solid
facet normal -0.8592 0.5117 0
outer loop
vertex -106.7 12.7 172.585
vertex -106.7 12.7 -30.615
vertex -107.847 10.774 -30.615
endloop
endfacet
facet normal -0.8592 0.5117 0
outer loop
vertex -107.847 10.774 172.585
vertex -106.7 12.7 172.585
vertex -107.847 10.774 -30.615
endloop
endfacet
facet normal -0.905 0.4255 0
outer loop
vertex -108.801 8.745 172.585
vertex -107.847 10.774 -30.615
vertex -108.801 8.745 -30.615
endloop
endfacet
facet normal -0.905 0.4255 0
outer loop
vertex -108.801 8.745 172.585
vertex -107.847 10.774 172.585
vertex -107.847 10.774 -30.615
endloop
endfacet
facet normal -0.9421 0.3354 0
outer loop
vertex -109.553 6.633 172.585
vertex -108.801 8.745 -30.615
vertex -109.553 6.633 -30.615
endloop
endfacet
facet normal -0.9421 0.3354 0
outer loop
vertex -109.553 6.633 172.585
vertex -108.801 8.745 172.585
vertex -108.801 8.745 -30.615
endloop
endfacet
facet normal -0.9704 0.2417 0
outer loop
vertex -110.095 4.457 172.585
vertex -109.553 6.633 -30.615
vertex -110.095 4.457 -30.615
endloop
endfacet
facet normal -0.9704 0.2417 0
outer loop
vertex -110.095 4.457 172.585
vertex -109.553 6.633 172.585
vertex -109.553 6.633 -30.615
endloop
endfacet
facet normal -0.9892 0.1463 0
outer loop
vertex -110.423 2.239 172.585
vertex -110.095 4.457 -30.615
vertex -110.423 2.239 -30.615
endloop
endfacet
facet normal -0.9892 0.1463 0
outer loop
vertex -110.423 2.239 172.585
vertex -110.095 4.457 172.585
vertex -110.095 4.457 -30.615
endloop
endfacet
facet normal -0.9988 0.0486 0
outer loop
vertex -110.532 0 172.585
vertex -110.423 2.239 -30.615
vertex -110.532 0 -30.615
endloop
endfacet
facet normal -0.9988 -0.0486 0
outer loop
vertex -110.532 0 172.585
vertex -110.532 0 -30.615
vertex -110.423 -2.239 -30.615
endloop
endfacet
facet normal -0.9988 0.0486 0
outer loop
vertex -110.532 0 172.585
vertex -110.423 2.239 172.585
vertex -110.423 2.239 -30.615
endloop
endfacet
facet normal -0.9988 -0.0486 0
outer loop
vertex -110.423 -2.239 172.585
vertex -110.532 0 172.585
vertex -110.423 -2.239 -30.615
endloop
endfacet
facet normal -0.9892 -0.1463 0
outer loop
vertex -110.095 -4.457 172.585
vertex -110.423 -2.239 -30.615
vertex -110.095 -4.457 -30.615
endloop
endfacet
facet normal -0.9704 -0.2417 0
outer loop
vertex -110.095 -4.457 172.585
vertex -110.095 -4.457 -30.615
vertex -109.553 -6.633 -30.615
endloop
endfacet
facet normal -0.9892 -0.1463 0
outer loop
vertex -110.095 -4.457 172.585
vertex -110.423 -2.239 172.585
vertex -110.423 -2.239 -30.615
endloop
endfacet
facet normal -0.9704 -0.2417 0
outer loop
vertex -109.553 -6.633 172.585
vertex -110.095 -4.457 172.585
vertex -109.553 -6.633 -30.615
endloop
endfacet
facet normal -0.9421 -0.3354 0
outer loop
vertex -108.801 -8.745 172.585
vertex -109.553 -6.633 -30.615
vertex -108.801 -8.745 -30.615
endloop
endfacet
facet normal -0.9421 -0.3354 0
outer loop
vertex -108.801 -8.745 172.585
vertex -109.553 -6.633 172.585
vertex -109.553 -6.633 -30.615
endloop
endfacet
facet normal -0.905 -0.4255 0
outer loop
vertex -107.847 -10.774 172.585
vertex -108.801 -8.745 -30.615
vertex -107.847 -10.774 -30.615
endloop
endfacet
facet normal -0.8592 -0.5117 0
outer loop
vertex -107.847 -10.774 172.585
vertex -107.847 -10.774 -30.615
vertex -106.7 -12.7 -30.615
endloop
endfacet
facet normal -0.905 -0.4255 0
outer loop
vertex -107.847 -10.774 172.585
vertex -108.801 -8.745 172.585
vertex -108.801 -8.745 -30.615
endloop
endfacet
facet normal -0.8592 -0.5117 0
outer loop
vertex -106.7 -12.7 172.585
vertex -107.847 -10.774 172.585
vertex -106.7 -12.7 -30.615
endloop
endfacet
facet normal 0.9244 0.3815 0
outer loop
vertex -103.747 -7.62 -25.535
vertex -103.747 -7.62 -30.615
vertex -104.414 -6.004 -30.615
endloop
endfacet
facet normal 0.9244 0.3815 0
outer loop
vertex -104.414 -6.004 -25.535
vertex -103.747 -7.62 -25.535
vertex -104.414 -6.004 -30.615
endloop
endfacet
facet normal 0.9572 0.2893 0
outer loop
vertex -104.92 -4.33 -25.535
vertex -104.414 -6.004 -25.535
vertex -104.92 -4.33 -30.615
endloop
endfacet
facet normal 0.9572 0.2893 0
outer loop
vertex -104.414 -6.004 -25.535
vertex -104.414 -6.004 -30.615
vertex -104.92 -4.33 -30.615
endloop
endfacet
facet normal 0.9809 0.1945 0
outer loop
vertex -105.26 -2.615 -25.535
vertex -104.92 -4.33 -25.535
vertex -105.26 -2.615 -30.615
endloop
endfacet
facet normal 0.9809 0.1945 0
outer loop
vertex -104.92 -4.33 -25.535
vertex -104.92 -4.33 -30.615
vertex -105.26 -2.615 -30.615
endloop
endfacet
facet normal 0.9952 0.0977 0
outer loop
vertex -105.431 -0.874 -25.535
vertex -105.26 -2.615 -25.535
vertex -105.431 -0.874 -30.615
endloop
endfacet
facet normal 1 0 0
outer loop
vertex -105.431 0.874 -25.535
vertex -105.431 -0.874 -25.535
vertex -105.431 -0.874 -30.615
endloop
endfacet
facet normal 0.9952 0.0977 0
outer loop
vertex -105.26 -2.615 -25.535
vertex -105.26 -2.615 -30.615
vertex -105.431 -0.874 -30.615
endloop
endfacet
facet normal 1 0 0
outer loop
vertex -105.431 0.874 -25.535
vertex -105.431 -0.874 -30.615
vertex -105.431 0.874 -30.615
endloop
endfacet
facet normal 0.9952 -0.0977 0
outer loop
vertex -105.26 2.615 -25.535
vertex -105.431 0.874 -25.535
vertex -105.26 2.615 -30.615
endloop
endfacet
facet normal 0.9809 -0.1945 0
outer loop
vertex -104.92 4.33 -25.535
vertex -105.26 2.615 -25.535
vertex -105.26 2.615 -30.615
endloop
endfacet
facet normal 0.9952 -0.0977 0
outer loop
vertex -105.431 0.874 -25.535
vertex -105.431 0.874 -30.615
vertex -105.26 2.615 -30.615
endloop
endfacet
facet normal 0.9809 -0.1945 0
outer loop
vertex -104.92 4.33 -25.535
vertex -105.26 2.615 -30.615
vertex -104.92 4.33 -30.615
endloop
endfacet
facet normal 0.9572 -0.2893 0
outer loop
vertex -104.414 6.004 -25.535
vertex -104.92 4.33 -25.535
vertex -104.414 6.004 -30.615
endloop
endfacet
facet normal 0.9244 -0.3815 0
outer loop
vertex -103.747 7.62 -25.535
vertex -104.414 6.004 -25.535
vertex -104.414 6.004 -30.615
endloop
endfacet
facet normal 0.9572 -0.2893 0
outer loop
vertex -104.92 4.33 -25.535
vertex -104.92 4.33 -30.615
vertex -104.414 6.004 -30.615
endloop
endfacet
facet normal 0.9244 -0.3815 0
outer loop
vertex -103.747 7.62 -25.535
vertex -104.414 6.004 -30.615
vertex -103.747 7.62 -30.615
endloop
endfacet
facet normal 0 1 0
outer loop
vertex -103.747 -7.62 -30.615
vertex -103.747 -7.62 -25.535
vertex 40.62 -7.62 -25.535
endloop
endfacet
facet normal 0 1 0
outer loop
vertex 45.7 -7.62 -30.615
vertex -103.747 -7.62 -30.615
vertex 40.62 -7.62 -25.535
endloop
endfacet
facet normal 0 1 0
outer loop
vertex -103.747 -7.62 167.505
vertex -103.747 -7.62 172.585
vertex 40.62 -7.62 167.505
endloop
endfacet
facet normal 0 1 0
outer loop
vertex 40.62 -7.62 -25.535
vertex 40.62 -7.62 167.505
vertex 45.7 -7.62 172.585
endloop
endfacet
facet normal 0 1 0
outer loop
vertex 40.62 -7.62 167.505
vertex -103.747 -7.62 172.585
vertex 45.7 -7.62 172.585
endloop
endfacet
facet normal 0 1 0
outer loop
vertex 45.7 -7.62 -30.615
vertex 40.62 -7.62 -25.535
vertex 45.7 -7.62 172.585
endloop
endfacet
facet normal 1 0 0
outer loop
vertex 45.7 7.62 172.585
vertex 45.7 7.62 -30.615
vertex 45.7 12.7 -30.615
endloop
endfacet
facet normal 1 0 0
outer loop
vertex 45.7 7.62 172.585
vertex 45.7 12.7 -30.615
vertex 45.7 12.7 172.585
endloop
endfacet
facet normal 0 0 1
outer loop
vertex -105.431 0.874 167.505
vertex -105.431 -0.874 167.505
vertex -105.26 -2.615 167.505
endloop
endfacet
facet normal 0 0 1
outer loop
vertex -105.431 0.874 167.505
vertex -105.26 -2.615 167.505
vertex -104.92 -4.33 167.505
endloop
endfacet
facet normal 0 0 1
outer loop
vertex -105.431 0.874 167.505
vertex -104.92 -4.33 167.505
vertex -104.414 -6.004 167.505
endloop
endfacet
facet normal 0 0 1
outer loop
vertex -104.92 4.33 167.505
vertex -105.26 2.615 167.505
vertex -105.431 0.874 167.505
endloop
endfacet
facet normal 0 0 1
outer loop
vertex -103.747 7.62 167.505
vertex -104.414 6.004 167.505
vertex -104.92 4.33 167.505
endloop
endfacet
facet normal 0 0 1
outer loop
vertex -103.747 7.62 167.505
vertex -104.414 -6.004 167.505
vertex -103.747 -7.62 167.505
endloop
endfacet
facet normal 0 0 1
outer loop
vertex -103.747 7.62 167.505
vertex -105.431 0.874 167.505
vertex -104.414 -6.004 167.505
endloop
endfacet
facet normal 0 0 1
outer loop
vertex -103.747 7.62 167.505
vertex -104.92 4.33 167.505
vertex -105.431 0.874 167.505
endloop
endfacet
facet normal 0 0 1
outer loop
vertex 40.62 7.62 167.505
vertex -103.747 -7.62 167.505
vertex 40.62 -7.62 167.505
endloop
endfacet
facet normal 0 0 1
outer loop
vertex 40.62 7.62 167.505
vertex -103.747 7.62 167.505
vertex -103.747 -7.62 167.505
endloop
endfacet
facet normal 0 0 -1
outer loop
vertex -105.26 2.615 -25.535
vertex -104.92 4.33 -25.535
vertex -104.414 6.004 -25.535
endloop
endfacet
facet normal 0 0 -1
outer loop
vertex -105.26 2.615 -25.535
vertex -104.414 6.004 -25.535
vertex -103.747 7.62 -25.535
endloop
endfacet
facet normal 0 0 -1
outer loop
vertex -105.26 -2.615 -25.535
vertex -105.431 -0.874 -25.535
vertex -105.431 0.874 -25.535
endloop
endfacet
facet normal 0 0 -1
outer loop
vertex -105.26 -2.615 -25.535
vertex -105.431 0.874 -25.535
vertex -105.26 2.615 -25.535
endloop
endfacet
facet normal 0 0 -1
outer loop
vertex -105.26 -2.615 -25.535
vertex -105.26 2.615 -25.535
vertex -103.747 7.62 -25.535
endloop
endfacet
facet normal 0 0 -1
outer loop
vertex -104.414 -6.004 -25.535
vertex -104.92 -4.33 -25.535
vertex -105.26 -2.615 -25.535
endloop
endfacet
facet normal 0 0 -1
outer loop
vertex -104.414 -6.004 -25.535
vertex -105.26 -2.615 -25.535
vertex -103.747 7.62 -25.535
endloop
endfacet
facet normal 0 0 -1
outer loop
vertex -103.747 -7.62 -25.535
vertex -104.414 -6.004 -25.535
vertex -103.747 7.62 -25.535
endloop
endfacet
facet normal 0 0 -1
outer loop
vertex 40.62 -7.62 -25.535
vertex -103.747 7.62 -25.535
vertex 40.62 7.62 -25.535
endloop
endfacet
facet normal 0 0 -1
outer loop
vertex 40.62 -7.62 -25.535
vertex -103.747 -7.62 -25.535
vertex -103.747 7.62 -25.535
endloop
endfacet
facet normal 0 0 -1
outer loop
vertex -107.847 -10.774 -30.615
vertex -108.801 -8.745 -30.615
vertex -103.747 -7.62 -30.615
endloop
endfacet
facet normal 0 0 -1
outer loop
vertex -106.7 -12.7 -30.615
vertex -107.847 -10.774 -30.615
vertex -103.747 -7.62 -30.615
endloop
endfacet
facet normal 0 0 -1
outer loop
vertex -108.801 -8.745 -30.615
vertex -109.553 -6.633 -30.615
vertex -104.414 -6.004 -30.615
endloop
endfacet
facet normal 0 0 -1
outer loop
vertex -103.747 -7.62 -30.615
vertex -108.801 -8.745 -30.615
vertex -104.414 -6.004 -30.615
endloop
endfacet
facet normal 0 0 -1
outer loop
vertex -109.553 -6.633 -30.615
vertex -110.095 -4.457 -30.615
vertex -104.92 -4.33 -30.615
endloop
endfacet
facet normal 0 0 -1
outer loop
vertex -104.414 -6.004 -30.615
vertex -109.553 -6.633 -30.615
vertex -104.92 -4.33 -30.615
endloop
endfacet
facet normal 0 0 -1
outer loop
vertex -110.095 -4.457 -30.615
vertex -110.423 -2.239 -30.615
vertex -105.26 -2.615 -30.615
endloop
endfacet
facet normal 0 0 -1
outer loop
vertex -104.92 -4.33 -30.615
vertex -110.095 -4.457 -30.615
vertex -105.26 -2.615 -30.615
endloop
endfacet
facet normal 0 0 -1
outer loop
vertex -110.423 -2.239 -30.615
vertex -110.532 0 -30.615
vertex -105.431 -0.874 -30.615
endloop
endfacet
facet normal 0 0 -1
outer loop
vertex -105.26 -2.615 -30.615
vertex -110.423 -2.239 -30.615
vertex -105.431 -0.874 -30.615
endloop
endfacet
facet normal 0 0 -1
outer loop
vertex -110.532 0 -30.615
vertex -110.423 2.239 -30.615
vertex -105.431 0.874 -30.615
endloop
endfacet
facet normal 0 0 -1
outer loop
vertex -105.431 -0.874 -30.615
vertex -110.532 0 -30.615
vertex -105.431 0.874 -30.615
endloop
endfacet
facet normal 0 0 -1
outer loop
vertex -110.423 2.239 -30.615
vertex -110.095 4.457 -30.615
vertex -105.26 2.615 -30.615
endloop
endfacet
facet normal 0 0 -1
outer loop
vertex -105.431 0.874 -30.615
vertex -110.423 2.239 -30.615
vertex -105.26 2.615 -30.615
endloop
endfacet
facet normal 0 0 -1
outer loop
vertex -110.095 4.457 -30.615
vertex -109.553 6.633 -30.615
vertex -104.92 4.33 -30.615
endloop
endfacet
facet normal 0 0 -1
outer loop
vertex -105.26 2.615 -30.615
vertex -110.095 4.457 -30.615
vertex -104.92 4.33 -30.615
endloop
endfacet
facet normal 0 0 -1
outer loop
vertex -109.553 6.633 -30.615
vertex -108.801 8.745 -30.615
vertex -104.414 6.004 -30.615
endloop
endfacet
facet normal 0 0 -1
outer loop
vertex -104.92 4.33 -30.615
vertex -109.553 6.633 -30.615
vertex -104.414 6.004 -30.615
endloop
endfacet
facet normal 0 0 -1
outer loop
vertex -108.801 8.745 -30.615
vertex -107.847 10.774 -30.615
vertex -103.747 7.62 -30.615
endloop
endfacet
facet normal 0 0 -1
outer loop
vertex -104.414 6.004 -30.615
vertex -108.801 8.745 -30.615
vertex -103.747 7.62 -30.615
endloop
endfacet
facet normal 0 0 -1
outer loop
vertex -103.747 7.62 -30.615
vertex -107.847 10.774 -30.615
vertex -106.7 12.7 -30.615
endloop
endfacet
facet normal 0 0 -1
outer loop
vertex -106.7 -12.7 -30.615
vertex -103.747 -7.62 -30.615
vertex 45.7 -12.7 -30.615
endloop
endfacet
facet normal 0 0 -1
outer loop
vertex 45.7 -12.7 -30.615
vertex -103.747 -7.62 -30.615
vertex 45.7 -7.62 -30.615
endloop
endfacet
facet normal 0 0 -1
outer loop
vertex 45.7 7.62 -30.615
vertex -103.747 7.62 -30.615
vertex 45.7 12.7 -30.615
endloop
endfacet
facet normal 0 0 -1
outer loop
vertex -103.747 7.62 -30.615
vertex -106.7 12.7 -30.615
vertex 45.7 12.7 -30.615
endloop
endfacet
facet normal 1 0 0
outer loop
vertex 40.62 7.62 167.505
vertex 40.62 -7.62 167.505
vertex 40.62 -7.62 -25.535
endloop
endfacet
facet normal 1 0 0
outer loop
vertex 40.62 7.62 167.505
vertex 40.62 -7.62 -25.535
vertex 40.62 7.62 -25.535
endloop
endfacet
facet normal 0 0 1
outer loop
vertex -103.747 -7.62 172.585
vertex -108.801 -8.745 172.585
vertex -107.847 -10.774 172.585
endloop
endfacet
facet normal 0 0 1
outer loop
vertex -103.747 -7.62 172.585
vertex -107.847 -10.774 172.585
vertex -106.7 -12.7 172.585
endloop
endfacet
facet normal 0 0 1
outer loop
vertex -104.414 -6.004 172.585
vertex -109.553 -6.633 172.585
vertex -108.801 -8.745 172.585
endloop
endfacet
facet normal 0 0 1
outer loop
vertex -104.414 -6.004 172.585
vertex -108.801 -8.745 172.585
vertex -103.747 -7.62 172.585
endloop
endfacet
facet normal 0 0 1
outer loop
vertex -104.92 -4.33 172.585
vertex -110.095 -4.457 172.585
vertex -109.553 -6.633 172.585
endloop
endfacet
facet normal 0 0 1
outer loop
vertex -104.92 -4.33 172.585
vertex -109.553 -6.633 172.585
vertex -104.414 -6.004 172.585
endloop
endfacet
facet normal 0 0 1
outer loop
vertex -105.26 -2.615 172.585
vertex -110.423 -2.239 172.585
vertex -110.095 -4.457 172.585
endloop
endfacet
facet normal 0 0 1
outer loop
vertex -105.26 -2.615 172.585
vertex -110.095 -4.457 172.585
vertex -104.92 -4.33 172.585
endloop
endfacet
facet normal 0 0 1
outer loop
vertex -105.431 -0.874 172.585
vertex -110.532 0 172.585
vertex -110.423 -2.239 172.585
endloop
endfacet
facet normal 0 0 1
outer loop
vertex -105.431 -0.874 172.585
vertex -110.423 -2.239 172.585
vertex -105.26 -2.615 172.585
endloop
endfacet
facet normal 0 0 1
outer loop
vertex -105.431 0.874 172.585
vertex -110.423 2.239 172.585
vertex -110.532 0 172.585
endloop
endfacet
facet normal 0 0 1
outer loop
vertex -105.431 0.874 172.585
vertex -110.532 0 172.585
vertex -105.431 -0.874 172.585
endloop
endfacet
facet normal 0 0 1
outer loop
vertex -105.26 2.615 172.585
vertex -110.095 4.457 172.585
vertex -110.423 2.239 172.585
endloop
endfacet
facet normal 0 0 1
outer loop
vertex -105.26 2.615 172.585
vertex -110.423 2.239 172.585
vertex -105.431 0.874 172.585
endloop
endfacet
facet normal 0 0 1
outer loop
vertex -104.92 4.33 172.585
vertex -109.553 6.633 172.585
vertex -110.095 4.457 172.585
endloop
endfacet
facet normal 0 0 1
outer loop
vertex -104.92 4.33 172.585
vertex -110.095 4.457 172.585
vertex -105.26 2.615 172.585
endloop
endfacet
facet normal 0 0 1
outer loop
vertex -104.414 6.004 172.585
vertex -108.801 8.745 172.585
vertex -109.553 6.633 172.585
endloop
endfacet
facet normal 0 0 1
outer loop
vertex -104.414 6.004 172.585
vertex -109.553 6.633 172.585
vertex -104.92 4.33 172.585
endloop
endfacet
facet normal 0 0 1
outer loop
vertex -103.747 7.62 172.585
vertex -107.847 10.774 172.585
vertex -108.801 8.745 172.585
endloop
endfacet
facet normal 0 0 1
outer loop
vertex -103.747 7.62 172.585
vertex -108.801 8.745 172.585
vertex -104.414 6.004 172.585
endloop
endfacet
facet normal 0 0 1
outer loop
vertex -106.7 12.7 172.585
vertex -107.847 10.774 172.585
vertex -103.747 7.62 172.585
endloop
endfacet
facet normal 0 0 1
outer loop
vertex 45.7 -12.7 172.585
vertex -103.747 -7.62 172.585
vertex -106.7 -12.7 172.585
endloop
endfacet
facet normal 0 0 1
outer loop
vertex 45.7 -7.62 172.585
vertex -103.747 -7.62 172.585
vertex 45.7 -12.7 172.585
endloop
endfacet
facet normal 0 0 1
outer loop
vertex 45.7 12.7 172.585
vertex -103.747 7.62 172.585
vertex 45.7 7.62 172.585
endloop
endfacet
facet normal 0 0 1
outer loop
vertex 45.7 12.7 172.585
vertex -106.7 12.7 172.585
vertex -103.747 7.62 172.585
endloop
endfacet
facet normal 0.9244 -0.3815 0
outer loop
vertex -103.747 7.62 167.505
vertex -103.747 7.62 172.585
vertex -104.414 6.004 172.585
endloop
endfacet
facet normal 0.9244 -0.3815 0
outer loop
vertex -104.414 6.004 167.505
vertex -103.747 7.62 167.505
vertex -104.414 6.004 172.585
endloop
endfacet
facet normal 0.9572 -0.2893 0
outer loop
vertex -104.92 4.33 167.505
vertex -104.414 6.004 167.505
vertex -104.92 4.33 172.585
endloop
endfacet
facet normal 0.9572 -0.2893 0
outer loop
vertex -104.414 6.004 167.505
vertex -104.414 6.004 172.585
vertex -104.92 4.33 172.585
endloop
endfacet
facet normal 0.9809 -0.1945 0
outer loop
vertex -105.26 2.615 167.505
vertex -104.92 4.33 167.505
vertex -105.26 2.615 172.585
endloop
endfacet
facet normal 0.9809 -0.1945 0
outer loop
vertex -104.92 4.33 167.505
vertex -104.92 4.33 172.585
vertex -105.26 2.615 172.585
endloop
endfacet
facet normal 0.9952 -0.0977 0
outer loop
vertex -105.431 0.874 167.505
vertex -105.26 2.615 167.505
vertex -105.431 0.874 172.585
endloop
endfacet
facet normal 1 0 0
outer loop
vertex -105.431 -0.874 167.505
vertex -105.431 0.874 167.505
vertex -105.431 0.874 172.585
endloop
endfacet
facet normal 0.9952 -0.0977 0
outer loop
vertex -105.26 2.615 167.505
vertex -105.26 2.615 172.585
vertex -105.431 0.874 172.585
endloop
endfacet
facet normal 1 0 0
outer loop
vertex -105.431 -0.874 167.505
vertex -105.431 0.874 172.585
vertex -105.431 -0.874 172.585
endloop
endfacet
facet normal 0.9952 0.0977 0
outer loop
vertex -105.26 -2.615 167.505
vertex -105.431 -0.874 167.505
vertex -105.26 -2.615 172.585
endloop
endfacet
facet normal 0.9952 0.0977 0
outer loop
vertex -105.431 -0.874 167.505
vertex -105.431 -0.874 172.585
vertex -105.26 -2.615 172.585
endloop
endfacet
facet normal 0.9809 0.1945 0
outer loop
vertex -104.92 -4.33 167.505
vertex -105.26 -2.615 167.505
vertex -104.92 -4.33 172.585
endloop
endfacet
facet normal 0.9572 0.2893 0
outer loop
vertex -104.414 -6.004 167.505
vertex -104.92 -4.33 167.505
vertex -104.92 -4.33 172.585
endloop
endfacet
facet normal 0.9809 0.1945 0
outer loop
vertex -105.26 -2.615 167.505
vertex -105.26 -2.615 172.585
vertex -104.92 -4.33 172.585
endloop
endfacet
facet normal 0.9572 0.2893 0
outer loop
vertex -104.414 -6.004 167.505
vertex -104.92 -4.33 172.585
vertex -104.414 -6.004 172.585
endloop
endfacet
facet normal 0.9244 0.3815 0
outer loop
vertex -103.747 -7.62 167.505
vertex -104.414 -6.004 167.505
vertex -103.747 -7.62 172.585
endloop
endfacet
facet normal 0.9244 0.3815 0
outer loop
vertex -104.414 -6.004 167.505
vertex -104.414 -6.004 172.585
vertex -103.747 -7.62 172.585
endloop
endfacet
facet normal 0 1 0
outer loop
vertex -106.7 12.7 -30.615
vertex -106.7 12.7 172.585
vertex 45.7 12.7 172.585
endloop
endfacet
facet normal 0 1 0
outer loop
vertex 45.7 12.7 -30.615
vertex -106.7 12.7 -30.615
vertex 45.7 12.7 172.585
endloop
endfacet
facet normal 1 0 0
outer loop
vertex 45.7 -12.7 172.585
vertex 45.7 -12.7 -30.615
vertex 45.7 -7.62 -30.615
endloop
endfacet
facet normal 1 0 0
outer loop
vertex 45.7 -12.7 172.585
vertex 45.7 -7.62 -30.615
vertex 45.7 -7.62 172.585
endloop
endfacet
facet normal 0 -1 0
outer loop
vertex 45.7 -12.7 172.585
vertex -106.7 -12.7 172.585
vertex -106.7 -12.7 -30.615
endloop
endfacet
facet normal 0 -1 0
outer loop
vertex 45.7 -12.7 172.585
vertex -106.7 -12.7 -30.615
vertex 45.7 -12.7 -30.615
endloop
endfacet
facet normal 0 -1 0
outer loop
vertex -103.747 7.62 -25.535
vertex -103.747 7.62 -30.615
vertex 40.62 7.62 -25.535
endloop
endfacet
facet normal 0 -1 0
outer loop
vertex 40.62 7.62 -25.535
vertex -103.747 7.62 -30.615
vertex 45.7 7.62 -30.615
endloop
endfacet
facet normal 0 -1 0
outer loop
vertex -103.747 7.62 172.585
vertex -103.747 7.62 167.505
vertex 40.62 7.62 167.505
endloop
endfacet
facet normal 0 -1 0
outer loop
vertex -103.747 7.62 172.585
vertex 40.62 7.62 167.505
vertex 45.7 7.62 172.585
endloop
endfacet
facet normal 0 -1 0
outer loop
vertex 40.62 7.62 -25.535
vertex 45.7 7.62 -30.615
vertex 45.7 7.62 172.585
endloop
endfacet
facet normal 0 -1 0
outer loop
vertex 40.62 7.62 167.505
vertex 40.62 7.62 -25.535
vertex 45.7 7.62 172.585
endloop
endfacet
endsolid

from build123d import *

# Parameters (mm, degrees)
F0_W     = 152.4
F0_H     = 203.2
F1_DEPTH = 12.7
F2_W     = 15.24
F2_H     = 203.2
F3_DEPTH = 5.08
F5_DEPTH = 203.2
F7_DEPTH = 5.08
F9_DEPTH = 5.08


with BuildPart() as f1:
    # F0 (on Front) → F1 (new body, symmetric)
    with BuildSketch(Plane.XZ):
        with Locations((-30.4995095253, 70.9851061165)):
            Rectangle(F0_W, F0_H)
    extrude(amount=F1_DEPTH, both=True)

    # F2 (on face) → F3 (cut)
    with BuildSketch(Plane.YZ.offset(45.7004904747)):
        with Locations((0, 70.9851061165)):
            Rectangle(F2_W, F2_H)
    extrude(amount=-F3_DEPTH, mode=Mode.SUBTRACT)

    # F4 (on face) → F5 (join)
    with BuildSketch(Plane.XY.offset(172.5851061165)):
        with BuildLine():
            Line((-106.6995095253, -12.7), (-106.6995095253, 12.7))
            ThreePointArc((-106.6995095253, 12.7), (-110.5322322417, 0), (-106.6995095253, -12.7))
        make_face()
    extrude(amount=-F5_DEPTH)

    # F6 (on face) → F7 (cut)
    with BuildSketch(Plane.XY.offset(172.5851061165)):
        with BuildLine():
            Line((40.6204904747, 7.62), (-103.746953477, 7.62))
            ThreePointArc((-103.746953477, 7.62), (-105.4522322417, 0), (-103.746953477, -7.62))
            Line((-103.746953477, -7.62), (40.6204904747, -7.62))
            Line((40.6204904747, -7.62), (40.6204904747, 7.62))
        make_face()
    extrude(amount=-F7_DEPTH, mode=Mode.SUBTRACT)

    # F8 (on face) → F9 (cut)
    with BuildSketch(Plane(origin=(0, 0, -30.6148938835), x_dir=(1, 0, 0), z_dir=(0, 0, -1))):
        with BuildLine():
            ThreePointArc((-103.746953477, 7.62), (-105.4522322417, 0), (-103.746953477, -7.62))
            Line((-103.746953477, -7.62), (40.6204904747, -7.62))
            Line((40.6204904747, -7.62), (40.6204904747, 7.62))
            Line((40.6204904747, 7.62), (-103.746953477, 7.62))
        make_face()
    extrude(amount=-F9_DEPTH, mode=Mode.SUBTRACT)


solid = f1.part
